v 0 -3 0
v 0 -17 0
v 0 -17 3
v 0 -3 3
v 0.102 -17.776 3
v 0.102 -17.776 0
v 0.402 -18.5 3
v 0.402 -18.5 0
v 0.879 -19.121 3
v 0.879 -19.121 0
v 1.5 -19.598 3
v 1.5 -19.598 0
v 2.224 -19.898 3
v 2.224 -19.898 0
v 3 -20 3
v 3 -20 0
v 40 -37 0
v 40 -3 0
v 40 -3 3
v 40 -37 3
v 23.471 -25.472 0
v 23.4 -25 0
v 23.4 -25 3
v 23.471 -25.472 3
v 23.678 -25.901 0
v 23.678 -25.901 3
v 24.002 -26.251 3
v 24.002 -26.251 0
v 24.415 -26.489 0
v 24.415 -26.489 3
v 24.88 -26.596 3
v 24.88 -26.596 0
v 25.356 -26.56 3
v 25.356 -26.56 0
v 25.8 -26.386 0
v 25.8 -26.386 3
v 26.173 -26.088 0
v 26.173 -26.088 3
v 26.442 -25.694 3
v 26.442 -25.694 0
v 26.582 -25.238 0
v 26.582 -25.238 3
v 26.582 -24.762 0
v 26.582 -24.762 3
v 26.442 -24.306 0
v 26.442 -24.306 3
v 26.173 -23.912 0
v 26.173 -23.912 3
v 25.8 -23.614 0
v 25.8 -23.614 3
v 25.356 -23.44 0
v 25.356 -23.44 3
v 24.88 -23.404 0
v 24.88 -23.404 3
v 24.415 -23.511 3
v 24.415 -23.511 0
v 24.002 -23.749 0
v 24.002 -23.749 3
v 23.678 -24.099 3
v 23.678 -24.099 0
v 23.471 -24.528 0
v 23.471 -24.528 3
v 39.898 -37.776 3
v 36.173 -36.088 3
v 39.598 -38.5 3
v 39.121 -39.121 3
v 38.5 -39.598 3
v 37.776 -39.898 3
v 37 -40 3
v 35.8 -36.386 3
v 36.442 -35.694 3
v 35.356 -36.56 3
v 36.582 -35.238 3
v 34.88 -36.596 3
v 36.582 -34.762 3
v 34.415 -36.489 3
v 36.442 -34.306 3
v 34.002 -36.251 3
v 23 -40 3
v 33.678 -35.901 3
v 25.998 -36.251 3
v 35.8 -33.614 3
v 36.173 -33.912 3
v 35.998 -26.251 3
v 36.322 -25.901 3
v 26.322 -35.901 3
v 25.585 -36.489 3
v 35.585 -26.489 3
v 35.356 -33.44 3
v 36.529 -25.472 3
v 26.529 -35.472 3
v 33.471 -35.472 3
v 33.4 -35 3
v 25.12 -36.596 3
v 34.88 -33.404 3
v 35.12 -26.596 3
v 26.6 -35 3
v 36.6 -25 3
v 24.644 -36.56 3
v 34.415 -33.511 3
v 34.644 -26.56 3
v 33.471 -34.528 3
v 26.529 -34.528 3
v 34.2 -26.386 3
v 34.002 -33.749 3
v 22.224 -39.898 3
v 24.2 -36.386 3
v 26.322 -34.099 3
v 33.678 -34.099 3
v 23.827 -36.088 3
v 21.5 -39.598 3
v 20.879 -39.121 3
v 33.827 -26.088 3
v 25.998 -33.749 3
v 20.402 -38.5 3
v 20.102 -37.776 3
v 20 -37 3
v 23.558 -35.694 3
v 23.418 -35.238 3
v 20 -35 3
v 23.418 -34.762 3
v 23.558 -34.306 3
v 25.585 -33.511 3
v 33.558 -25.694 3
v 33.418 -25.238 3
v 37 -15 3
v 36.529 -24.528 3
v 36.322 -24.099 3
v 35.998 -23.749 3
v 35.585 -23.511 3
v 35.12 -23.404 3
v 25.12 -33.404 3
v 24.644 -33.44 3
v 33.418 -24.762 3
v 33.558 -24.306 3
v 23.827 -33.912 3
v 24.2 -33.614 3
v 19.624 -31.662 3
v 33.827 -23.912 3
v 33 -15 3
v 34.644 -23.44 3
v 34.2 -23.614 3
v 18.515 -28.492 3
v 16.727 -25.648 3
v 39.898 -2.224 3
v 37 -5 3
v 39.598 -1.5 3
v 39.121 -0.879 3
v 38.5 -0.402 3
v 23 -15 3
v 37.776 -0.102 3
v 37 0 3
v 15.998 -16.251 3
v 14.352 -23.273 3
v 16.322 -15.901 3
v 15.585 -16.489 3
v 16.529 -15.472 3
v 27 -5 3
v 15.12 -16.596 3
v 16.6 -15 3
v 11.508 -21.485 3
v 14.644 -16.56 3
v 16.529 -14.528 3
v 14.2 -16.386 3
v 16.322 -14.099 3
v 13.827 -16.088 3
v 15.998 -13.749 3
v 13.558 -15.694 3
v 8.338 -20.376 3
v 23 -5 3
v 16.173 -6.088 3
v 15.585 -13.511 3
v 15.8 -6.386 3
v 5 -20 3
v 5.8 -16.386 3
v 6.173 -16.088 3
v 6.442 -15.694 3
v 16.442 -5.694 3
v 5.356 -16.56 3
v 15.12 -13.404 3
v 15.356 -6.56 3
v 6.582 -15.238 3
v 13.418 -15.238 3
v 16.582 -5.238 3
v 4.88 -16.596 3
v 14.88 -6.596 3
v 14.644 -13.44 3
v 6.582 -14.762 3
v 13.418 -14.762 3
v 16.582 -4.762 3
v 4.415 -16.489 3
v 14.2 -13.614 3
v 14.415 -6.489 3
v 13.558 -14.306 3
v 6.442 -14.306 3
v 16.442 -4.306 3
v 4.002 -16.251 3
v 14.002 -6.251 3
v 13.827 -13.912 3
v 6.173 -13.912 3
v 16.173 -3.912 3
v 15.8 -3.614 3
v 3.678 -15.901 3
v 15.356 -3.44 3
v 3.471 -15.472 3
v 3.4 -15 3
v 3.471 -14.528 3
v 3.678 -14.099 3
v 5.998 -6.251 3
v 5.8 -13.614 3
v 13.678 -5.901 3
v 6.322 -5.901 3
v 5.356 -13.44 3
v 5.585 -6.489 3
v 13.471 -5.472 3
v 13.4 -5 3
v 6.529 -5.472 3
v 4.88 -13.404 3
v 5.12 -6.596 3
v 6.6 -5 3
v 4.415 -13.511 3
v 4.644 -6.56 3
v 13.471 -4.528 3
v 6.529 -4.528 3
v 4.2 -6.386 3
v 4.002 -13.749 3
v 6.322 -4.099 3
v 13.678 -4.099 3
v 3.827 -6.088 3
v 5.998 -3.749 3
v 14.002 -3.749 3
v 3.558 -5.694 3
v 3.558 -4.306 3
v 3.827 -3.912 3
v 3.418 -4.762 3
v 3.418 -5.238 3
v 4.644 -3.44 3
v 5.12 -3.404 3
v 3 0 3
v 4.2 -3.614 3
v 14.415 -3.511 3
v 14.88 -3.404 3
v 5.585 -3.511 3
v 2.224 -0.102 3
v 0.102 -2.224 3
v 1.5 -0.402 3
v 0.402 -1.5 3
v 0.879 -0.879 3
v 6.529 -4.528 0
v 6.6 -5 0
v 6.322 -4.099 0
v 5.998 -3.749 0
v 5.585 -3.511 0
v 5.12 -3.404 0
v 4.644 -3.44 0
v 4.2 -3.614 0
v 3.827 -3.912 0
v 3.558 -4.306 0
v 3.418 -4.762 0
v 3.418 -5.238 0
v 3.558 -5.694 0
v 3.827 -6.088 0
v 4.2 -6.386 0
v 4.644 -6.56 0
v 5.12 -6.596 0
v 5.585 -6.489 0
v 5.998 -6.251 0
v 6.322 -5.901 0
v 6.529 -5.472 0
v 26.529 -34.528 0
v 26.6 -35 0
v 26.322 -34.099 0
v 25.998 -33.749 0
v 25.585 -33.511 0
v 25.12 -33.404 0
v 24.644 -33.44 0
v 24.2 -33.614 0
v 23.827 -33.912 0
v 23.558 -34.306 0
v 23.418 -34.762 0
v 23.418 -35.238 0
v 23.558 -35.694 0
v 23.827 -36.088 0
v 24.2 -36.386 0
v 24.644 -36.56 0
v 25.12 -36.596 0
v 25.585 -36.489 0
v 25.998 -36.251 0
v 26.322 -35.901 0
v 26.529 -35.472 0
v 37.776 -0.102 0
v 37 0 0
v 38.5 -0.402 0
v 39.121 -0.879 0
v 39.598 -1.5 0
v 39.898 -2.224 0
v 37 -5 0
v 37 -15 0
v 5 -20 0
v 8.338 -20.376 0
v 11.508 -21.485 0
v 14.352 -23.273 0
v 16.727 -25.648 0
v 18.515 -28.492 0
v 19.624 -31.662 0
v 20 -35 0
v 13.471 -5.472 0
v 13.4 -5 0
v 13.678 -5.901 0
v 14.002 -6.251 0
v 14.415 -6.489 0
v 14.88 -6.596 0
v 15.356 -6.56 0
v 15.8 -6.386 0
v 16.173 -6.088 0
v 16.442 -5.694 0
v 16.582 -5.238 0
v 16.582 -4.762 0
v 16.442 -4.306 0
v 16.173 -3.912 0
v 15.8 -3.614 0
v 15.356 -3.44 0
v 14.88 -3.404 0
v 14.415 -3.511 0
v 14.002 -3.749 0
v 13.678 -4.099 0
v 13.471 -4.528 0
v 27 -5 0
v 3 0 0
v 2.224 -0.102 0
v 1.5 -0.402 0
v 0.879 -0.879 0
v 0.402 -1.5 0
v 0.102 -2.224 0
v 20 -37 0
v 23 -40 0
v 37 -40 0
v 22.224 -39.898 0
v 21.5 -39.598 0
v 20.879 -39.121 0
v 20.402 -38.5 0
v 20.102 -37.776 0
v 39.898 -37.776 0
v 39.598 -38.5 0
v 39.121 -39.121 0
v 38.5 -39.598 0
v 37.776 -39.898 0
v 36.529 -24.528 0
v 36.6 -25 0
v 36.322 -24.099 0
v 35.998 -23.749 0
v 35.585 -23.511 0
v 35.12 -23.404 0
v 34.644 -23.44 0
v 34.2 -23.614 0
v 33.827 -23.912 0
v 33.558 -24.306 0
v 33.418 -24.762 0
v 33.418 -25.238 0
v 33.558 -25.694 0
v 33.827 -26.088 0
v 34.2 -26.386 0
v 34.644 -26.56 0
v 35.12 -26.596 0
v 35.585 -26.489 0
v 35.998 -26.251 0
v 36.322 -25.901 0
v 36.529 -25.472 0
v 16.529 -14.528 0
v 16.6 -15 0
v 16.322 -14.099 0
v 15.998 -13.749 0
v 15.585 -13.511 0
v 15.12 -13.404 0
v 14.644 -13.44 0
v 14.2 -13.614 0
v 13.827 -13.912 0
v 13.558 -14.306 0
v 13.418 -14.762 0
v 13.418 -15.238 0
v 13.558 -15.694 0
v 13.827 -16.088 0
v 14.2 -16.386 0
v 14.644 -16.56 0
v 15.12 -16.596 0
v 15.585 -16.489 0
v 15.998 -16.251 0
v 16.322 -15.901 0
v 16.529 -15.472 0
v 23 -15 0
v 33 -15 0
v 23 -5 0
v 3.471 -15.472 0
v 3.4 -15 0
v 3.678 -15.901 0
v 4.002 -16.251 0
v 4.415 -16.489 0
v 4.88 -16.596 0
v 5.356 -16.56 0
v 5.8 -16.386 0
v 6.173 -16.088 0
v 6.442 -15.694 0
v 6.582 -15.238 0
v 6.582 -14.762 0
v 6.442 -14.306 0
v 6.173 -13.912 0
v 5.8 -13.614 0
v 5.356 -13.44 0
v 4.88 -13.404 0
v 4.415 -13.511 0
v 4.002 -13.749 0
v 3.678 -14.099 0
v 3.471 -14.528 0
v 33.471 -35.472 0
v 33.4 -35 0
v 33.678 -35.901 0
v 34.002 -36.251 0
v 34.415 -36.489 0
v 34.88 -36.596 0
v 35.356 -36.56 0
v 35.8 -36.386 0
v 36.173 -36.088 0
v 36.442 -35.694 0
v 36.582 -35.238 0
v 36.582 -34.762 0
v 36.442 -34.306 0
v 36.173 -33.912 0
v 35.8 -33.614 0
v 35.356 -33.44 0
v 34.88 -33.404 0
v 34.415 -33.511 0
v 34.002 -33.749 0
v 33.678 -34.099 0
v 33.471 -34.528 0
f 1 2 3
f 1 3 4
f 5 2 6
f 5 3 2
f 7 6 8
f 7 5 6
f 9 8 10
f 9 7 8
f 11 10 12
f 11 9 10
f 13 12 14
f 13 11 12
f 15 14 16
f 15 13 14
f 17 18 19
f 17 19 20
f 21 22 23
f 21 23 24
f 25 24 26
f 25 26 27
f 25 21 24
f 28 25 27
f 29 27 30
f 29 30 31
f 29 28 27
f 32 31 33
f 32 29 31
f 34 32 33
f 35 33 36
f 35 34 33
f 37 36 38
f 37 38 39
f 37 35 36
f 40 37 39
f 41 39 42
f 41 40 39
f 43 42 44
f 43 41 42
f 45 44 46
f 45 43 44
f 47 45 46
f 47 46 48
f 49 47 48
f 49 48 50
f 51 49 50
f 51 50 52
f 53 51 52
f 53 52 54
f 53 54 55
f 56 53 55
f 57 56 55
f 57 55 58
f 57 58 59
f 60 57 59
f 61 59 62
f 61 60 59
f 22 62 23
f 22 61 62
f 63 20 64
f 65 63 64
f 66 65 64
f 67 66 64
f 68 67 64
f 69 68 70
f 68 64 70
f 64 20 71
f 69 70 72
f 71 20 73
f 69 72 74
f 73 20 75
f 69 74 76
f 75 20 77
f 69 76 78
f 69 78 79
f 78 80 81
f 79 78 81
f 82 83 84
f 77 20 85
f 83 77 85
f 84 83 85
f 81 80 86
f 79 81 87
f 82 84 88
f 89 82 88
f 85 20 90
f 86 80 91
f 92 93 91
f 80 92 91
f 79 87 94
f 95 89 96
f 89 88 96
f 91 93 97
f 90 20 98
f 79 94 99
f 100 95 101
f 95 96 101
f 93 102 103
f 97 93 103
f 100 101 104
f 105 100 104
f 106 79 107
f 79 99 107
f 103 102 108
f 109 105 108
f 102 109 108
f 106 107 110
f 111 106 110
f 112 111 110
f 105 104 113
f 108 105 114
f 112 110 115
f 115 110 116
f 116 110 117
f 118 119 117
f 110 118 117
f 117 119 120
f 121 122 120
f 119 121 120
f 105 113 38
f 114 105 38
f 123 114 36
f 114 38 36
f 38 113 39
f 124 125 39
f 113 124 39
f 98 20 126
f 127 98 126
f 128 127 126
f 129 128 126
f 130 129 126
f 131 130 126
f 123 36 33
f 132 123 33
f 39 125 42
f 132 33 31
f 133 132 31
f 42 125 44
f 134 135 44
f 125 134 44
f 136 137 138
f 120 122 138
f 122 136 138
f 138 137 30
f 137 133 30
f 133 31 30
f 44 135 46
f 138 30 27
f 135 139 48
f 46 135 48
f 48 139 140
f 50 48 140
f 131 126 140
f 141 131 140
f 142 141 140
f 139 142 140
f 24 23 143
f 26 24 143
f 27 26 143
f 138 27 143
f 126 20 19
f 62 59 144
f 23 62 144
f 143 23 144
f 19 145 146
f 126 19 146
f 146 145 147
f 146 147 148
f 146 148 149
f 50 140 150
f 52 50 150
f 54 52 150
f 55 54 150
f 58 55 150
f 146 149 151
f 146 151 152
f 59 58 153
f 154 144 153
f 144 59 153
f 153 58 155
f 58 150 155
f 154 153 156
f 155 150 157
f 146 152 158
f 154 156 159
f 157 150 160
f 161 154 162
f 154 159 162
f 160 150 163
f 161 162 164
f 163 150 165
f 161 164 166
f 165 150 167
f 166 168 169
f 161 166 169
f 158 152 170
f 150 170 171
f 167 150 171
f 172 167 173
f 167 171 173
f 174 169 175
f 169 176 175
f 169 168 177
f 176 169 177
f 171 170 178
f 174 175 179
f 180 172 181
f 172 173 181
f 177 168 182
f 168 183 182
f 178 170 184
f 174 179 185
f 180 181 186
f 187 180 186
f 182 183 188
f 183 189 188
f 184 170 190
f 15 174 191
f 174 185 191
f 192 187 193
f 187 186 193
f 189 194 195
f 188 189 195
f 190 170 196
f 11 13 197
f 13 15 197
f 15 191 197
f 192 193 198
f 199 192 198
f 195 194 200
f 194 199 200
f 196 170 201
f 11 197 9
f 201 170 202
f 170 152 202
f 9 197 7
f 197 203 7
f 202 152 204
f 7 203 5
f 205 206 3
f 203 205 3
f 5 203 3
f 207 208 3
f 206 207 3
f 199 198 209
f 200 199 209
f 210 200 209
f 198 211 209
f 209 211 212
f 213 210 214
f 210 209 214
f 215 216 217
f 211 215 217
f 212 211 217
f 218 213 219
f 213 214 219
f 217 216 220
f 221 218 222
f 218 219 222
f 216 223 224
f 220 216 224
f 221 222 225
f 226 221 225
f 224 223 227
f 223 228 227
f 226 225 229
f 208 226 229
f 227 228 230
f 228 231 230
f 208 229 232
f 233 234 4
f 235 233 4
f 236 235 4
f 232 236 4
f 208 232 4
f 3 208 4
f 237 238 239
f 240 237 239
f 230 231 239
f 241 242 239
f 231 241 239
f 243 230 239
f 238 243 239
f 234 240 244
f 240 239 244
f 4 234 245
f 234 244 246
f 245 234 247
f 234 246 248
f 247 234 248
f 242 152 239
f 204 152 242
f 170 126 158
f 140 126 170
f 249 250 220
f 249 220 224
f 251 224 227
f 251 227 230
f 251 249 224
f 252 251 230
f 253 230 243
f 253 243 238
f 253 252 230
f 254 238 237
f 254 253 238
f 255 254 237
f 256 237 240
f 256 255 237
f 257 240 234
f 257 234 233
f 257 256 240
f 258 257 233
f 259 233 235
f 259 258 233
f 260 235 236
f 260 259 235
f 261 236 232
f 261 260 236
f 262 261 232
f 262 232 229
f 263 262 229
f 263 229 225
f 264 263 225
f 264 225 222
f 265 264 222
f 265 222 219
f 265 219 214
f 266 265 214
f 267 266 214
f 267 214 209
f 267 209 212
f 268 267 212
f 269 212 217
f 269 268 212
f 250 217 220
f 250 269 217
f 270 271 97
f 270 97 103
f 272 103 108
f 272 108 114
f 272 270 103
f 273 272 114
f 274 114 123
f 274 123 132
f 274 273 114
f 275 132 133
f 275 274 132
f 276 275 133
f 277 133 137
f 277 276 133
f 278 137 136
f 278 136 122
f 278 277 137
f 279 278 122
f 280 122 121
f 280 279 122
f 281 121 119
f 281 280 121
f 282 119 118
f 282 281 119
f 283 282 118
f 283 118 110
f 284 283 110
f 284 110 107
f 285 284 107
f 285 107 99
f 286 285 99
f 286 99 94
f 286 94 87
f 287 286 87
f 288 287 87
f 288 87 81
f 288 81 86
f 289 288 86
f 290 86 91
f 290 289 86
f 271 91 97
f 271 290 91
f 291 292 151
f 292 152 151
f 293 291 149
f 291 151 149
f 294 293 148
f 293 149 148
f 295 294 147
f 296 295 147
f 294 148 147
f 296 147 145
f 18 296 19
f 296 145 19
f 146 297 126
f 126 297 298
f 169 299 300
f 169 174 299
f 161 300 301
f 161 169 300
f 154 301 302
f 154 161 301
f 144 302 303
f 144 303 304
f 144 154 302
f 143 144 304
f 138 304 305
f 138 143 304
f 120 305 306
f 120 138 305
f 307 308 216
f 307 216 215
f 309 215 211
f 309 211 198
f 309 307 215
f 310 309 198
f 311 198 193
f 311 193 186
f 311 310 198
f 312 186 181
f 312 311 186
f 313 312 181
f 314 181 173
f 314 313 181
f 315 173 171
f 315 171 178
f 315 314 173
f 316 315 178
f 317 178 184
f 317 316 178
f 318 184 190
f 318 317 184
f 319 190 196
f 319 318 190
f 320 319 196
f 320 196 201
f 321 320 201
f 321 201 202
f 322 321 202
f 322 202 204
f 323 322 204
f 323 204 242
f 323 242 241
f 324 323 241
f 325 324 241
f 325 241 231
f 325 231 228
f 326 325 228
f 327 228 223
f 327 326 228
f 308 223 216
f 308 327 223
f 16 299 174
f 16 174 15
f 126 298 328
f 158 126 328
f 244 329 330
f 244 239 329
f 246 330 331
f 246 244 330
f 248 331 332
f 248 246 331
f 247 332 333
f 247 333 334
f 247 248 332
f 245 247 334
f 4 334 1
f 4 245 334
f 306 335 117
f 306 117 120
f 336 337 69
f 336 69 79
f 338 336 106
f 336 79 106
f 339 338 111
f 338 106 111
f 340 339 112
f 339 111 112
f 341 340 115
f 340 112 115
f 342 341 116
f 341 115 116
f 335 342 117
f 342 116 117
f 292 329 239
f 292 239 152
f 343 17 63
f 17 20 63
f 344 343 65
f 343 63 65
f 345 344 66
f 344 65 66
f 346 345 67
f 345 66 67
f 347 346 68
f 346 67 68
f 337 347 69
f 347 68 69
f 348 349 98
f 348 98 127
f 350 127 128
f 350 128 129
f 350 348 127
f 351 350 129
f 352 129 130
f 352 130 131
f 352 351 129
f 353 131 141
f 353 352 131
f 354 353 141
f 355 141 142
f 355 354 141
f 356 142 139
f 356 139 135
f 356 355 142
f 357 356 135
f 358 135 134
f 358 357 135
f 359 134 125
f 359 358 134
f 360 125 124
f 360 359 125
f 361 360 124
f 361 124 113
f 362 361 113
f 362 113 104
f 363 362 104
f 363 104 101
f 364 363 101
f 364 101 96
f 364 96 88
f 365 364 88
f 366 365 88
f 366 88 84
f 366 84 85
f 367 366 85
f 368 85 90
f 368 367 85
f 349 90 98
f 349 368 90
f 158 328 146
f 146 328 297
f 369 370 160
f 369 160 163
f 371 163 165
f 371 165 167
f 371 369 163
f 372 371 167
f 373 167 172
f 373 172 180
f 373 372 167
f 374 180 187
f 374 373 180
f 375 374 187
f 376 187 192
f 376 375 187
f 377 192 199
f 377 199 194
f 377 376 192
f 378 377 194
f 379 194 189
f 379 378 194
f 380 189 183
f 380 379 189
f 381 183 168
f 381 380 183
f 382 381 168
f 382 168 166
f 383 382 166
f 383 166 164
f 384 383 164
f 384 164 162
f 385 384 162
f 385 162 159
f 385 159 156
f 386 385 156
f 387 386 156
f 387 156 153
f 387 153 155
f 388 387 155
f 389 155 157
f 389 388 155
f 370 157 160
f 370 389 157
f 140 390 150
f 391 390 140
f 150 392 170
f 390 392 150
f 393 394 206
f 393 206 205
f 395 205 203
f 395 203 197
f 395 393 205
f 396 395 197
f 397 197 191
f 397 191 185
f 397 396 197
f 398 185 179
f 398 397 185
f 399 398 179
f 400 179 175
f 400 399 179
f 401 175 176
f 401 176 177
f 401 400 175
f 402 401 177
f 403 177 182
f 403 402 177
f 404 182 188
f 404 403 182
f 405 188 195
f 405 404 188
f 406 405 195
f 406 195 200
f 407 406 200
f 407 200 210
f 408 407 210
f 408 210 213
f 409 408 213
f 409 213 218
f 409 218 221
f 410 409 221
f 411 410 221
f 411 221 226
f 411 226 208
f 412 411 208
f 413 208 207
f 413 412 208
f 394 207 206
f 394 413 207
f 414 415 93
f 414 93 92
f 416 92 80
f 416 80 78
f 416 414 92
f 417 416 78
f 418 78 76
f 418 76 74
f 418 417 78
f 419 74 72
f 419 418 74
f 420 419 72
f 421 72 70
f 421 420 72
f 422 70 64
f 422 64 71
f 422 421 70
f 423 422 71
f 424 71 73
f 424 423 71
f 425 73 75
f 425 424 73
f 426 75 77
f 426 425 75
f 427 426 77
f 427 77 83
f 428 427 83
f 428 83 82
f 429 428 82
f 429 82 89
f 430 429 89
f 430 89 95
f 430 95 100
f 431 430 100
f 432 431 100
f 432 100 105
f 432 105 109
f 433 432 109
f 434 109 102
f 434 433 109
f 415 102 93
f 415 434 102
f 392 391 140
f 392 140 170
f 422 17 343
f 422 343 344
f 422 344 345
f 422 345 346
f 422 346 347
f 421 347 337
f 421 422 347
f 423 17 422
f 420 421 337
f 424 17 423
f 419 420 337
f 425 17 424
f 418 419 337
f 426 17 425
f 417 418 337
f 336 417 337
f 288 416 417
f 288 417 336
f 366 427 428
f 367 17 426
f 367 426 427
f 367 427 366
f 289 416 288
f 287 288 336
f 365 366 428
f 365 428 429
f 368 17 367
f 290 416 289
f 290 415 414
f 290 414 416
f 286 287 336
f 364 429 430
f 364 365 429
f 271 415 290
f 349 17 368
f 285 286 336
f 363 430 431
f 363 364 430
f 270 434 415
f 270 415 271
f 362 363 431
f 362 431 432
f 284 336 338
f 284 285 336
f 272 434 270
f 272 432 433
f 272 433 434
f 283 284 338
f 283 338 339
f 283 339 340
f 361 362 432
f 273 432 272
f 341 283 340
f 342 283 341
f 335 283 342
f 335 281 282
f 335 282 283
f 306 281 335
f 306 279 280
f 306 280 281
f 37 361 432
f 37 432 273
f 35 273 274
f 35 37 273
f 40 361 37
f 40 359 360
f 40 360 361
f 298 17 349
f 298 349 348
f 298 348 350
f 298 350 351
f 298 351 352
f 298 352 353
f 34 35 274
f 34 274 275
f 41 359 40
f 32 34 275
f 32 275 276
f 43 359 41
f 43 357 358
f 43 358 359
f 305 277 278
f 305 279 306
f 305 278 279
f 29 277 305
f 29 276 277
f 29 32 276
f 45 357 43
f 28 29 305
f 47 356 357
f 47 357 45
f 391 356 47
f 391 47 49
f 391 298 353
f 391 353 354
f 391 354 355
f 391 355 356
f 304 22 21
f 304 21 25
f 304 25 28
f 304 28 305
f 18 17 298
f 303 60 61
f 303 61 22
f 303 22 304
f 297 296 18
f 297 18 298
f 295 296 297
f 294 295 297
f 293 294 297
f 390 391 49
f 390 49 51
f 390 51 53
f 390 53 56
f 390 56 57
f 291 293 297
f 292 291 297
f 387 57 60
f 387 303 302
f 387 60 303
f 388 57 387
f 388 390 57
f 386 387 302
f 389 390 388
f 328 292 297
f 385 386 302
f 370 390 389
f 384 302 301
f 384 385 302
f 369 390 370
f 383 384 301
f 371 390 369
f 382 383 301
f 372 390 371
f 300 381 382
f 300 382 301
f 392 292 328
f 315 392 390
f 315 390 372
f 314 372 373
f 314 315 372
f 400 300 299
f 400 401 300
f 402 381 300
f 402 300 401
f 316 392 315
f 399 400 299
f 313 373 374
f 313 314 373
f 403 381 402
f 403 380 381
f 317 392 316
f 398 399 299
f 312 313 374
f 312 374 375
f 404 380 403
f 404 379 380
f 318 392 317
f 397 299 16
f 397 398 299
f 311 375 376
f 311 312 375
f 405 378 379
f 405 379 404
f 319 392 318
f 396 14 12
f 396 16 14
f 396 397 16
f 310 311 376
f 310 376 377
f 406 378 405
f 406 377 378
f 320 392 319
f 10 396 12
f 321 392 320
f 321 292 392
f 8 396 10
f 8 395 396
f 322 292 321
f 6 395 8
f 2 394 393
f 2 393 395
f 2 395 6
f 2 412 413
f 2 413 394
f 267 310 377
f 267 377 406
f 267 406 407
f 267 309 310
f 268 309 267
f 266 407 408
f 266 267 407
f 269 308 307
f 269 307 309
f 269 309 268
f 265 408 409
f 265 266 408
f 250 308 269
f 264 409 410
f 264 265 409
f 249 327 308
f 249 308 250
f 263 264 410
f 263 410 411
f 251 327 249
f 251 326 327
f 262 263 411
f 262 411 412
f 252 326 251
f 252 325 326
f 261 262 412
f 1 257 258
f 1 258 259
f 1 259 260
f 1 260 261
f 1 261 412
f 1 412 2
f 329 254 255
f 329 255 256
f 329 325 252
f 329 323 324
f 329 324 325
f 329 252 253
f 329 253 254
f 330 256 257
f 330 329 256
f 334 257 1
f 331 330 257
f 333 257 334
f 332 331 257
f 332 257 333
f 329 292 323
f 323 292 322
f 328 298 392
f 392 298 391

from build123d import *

# Parameters (mm, degrees)
SKETCH_1_R      = 1.6
EXTRUDE_1_DEPTH = 3
FILLET_1_R      = 3
FILLET_2_R      = 15


with BuildPart() as part:
    # 草图1 → 凸台-拉伸1 (new body)
    with BuildSketch(Plane.XY):
        Polygon((0, 0), (40, 0), (40, -40), (20, -40), (20, -20), (0, -20), align=None)
        with Locations((5, -5)):
            Circle(SKETCH_1_R, mode=Mode.SUBTRACT)
        with Locations(Location((15, -5, 0), (0, 0, 180))):
            Circle(SKETCH_1_R, mode=Mode.SUBTRACT)
        with Locations((15, -15)):
            Circle(SKETCH_1_R, mode=Mode.SUBTRACT)
        with Locations(Location((5, -15, 0), (0, 0, 180))):
            Circle(SKETCH_1_R, mode=Mode.SUBTRACT)
        with Locations((25, -35)):
            Circle(SKETCH_1_R, mode=Mode.SUBTRACT)
        with Locations(Location((35, -35, 0), (0, 0, 180))):
            Circle(SKETCH_1_R, mode=Mode.SUBTRACT)
        with Locations((35, -25)):
            Circle(SKETCH_1_R, mode=Mode.SUBTRACT)
        with Locations(Location((25, -25, 0), (0, 0, 180))):
            Circle(SKETCH_1_R, mode=Mode.SUBTRACT)
        Polygon((23, -5), (23, -15), (33, -15), align=None, mode=Mode.SUBTRACT)
        Polygon((27, -5), (37, -5), (37, -15), align=None, mode=Mode.SUBTRACT)
    extrude(amount=EXTRUDE_1_DEPTH)

    # 圆角1
    fillet_1_edges = [part.edges().sort_by_distance(p)[0] for p in [
        (0, 0, 1.5),
        (40, 0, 1.5),
        (40, -40, 1.5),
        (20, -40, 1.5),
        (0, -20, 1.5),
    ]]
    fillet(fillet_1_edges, radius=FILLET_1_R)

    # 圆角2
    fillet_2_edges = [part.edges().sort_by_distance(p)[0] for p in [
        (20, -20, 1.5),
    ]]
    fillet(fillet_2_edges, radius=FILLET_2_R)


solid = part.part
